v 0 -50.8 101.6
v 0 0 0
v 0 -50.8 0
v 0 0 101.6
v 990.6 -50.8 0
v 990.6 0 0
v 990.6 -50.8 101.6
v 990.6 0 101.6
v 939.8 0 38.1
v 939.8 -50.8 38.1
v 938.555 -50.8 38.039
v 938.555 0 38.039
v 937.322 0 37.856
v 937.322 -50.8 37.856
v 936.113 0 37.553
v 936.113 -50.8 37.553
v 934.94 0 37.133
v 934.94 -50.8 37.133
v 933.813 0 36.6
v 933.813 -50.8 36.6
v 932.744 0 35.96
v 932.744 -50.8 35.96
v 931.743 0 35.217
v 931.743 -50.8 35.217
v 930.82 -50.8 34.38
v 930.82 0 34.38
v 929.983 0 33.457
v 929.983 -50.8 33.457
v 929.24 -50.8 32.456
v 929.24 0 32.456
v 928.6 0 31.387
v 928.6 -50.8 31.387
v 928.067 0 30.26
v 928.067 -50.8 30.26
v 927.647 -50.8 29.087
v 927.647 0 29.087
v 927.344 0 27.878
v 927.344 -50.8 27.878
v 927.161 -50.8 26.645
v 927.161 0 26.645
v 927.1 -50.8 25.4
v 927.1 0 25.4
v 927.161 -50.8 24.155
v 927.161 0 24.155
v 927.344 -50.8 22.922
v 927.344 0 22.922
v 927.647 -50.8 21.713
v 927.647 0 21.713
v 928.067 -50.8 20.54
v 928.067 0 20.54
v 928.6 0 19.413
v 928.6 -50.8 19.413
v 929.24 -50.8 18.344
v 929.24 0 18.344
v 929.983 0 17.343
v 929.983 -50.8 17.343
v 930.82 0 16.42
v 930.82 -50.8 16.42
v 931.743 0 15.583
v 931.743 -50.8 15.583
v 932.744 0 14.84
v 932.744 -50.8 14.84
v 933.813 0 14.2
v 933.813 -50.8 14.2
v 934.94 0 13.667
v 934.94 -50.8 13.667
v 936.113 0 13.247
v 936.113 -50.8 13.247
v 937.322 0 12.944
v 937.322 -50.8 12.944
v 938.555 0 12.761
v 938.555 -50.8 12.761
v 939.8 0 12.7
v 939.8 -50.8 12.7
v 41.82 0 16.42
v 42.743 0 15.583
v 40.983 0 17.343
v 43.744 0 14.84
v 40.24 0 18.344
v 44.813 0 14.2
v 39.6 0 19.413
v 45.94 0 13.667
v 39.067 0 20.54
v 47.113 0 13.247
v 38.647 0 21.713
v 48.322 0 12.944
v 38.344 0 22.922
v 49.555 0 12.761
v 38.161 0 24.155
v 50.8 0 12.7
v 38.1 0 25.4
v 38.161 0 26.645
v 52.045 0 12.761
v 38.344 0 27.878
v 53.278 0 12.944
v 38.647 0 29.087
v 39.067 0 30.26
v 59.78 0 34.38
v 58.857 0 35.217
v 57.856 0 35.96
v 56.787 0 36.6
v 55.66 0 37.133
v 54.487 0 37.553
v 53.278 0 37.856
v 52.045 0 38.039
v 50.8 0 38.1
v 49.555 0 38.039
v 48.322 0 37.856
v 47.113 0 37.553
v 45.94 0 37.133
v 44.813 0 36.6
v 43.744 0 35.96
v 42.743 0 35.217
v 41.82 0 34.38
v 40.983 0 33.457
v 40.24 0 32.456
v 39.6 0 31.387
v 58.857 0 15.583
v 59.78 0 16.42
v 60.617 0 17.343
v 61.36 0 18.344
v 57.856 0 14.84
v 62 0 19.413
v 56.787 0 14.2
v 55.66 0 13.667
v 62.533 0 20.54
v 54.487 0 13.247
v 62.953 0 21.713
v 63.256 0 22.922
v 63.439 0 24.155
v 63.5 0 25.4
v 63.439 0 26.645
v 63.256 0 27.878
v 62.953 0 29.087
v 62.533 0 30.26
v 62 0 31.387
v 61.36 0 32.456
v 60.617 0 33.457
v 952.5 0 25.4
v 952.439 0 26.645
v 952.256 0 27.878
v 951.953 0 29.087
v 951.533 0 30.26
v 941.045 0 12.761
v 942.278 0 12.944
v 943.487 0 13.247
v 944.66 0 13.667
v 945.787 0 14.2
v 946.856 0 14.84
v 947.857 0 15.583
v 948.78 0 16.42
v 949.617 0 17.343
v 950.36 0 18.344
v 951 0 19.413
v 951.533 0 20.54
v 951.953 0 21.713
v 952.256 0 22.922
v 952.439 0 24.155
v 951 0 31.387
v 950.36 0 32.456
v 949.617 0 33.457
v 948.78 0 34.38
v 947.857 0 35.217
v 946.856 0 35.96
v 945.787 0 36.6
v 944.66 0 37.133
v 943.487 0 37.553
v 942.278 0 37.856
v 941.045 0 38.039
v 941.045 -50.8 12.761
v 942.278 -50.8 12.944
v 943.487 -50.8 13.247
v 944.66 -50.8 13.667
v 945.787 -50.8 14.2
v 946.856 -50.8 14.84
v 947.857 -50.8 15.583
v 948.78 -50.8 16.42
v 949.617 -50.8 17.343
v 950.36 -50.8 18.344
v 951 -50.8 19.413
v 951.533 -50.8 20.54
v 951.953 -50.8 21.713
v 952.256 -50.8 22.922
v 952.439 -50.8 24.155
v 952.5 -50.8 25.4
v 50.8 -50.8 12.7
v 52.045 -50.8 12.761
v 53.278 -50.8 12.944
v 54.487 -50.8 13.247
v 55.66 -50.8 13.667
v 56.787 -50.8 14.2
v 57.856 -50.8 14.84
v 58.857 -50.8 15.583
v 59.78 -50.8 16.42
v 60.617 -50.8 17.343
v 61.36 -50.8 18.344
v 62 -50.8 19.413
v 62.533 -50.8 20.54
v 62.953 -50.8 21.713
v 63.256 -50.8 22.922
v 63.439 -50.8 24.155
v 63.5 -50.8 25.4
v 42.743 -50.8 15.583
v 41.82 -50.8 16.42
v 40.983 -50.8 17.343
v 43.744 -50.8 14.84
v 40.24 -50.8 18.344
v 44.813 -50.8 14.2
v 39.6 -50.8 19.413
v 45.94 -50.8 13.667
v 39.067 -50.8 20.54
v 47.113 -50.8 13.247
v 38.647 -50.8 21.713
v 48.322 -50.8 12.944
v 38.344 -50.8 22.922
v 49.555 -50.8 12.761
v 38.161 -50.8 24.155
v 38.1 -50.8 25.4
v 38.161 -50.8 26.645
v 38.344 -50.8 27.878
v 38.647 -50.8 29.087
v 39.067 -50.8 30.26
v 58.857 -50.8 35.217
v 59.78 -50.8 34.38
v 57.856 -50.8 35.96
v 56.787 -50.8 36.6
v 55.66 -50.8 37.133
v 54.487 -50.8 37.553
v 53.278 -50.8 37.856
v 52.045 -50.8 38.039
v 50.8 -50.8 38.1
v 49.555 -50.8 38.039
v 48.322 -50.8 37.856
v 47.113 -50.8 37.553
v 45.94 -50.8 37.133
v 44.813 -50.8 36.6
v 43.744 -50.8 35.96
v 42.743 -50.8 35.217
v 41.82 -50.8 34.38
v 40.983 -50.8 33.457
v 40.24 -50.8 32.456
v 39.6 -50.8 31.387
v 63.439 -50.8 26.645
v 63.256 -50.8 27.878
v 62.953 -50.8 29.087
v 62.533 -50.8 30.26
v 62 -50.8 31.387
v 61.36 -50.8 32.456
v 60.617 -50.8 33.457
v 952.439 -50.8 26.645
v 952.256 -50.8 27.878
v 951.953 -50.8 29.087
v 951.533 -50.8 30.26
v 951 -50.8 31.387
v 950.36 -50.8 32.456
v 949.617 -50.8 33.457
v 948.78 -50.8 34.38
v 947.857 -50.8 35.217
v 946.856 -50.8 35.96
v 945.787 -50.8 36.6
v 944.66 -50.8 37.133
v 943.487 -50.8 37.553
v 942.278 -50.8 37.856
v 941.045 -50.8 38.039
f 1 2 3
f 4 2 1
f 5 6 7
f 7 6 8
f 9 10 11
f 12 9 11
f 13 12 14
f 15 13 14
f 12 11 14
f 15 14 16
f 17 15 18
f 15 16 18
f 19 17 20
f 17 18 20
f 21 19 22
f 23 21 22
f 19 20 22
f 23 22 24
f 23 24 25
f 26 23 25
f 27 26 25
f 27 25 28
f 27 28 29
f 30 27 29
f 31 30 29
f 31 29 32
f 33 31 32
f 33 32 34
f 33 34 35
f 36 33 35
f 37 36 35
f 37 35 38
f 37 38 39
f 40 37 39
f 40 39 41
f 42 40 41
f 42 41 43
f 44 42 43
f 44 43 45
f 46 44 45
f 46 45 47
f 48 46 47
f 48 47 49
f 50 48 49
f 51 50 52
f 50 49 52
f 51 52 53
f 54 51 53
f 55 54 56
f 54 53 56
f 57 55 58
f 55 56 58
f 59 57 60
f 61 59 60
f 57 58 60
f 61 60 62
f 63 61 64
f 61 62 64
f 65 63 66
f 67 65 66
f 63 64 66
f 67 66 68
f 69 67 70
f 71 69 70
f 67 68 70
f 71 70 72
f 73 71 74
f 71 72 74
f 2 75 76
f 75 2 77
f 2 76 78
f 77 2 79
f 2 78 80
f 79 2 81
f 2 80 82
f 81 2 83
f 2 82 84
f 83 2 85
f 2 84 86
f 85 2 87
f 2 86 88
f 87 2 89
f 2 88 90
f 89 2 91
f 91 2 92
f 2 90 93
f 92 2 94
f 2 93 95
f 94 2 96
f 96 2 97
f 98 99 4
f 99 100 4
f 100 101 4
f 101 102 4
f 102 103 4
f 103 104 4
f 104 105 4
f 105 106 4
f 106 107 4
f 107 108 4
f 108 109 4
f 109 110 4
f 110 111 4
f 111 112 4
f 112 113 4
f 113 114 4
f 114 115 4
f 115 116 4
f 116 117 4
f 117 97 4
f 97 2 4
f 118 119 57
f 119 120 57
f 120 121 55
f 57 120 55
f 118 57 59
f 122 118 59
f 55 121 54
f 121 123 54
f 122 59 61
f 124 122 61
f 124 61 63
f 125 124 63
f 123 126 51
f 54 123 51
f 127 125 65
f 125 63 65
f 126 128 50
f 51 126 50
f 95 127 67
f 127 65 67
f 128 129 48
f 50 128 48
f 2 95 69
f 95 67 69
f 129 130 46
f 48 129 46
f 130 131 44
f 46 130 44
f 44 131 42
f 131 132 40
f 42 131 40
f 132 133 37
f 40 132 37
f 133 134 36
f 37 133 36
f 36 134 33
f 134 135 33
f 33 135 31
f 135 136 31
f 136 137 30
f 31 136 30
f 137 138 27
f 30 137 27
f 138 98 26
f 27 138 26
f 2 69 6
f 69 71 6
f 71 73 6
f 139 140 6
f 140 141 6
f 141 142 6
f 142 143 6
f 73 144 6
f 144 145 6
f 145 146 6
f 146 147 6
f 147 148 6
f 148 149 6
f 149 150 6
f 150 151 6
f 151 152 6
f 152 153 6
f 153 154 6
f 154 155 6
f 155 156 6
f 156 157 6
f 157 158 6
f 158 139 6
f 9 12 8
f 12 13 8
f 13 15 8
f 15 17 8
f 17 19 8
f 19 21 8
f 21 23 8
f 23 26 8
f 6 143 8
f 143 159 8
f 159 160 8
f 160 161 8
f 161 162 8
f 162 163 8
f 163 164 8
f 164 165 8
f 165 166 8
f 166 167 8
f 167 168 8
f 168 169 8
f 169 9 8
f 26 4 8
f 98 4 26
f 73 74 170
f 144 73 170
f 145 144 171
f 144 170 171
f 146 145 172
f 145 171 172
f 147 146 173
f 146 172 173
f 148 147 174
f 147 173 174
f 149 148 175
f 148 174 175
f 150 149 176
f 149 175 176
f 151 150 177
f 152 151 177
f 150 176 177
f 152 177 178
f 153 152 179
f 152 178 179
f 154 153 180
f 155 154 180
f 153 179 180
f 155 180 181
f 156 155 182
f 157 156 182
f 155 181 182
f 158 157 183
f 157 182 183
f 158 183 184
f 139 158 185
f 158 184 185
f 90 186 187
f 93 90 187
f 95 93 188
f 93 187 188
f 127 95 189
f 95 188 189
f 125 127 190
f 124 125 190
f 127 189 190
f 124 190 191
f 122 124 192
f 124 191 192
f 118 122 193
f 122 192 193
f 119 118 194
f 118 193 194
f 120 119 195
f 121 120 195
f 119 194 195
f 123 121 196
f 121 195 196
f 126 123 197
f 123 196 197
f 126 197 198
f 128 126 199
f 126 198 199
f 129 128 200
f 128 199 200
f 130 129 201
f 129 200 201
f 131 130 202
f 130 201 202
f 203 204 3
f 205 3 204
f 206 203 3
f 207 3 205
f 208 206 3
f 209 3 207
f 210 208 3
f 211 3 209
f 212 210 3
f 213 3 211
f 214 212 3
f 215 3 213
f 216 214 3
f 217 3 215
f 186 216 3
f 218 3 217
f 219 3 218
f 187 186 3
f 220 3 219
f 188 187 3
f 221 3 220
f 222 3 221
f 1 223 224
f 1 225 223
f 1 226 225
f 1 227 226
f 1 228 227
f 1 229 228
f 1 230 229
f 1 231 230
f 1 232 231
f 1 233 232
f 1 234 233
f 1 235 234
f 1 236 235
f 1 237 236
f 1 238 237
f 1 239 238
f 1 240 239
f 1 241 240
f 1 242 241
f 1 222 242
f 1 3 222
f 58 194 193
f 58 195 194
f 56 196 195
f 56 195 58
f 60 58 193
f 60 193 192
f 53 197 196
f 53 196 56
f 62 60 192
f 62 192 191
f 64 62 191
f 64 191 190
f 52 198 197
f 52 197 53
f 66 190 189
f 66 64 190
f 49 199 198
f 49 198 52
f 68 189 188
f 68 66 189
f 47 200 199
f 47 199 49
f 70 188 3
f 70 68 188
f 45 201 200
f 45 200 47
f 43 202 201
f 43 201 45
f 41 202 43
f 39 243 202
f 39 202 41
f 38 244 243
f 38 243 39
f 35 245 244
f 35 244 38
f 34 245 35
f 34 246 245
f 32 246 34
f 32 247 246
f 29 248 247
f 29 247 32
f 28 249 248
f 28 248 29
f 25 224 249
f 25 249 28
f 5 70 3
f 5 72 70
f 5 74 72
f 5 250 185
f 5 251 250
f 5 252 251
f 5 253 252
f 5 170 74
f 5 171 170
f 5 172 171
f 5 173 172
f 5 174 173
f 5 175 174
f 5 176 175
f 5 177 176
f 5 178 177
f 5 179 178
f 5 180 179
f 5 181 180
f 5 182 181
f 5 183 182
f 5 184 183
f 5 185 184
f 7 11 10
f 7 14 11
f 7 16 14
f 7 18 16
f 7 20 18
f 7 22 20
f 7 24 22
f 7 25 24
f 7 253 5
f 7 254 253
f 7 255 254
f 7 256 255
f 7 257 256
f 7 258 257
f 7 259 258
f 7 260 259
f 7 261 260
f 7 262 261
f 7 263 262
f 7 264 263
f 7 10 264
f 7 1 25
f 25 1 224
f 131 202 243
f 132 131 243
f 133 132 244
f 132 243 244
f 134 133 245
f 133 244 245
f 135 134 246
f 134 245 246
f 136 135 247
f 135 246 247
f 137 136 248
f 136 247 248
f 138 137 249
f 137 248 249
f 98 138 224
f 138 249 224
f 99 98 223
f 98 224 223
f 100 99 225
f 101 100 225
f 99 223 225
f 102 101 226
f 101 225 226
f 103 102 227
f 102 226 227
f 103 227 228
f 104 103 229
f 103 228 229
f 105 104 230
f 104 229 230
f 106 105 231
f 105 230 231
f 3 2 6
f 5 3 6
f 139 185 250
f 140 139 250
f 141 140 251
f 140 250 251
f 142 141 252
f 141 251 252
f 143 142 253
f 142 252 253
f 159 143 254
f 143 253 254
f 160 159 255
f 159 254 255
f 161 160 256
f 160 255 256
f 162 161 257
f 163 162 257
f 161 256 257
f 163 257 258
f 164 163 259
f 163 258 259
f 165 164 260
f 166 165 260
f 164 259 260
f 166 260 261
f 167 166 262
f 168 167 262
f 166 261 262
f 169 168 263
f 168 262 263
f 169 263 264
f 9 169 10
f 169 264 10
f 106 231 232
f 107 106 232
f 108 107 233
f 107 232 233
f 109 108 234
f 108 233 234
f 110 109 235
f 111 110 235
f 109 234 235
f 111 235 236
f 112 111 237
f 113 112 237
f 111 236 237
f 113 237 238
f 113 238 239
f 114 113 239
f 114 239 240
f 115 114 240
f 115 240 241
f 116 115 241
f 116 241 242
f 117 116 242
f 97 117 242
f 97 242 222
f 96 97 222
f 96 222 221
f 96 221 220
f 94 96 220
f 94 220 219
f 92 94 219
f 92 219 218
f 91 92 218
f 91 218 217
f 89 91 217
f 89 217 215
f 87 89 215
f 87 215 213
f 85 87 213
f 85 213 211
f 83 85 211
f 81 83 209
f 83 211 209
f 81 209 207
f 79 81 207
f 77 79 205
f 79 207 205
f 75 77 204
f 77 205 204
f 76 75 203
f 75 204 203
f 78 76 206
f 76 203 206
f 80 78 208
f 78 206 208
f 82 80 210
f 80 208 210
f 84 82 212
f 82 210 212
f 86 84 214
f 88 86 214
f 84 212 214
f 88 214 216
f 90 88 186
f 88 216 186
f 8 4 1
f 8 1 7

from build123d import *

# Parameters (mm, degrees)
F0_W     = 990.6
F0_H     = 101.6
F1_DEPTH = 50.8
F3_DEPTH = 50.801


with BuildPart() as f1:
    # F0 (on Front) → F1 (new body)
    with BuildSketch(Plane.XZ):
        with Locations((495.3, 50.8)):
            Rectangle(F0_W, F0_H)
    extrude(amount=F1_DEPTH)

    # F2 (on face) → F3 (cut, through all)
    with BuildSketch(Plane.XZ.offset(50.8)):
        with BuildLine():
            ThreePointArc((63.5, 25.4), (59.780256, 34.380256), (50.8, 38.1))
            Line((50.8, 38.1), (50.8, 12.7))
            ThreePointArc((50.8, 12.7), (59.780256, 16.419744), (63.5, 25.4))
        make_face()
        with BuildLine():
            Line((50.8, 12.7), (50.8, 38.1))
            ThreePointArc((50.8, 38.1), (38.1, 25.4), (50.8, 12.7))
        make_face()
        with BuildLine():
            ThreePointArc((952.5, 25.4), (948.780256, 34.380256), (939.8, 38.1))
            Line((939.8, 38.1), (939.8, 12.7))
            ThreePointArc((939.8, 12.7), (948.780256, 16.419744), (952.5, 25.4))
        make_face()
        with BuildLine():
            Line((939.8, 12.7), (939.8, 38.1))
            ThreePointArc((939.8, 38.1), (927.1, 25.4), (939.8, 12.7))
        make_face()
    extrude(amount=-F3_DEPTH, mode=Mode.SUBTRACT)


solid = f1.part
